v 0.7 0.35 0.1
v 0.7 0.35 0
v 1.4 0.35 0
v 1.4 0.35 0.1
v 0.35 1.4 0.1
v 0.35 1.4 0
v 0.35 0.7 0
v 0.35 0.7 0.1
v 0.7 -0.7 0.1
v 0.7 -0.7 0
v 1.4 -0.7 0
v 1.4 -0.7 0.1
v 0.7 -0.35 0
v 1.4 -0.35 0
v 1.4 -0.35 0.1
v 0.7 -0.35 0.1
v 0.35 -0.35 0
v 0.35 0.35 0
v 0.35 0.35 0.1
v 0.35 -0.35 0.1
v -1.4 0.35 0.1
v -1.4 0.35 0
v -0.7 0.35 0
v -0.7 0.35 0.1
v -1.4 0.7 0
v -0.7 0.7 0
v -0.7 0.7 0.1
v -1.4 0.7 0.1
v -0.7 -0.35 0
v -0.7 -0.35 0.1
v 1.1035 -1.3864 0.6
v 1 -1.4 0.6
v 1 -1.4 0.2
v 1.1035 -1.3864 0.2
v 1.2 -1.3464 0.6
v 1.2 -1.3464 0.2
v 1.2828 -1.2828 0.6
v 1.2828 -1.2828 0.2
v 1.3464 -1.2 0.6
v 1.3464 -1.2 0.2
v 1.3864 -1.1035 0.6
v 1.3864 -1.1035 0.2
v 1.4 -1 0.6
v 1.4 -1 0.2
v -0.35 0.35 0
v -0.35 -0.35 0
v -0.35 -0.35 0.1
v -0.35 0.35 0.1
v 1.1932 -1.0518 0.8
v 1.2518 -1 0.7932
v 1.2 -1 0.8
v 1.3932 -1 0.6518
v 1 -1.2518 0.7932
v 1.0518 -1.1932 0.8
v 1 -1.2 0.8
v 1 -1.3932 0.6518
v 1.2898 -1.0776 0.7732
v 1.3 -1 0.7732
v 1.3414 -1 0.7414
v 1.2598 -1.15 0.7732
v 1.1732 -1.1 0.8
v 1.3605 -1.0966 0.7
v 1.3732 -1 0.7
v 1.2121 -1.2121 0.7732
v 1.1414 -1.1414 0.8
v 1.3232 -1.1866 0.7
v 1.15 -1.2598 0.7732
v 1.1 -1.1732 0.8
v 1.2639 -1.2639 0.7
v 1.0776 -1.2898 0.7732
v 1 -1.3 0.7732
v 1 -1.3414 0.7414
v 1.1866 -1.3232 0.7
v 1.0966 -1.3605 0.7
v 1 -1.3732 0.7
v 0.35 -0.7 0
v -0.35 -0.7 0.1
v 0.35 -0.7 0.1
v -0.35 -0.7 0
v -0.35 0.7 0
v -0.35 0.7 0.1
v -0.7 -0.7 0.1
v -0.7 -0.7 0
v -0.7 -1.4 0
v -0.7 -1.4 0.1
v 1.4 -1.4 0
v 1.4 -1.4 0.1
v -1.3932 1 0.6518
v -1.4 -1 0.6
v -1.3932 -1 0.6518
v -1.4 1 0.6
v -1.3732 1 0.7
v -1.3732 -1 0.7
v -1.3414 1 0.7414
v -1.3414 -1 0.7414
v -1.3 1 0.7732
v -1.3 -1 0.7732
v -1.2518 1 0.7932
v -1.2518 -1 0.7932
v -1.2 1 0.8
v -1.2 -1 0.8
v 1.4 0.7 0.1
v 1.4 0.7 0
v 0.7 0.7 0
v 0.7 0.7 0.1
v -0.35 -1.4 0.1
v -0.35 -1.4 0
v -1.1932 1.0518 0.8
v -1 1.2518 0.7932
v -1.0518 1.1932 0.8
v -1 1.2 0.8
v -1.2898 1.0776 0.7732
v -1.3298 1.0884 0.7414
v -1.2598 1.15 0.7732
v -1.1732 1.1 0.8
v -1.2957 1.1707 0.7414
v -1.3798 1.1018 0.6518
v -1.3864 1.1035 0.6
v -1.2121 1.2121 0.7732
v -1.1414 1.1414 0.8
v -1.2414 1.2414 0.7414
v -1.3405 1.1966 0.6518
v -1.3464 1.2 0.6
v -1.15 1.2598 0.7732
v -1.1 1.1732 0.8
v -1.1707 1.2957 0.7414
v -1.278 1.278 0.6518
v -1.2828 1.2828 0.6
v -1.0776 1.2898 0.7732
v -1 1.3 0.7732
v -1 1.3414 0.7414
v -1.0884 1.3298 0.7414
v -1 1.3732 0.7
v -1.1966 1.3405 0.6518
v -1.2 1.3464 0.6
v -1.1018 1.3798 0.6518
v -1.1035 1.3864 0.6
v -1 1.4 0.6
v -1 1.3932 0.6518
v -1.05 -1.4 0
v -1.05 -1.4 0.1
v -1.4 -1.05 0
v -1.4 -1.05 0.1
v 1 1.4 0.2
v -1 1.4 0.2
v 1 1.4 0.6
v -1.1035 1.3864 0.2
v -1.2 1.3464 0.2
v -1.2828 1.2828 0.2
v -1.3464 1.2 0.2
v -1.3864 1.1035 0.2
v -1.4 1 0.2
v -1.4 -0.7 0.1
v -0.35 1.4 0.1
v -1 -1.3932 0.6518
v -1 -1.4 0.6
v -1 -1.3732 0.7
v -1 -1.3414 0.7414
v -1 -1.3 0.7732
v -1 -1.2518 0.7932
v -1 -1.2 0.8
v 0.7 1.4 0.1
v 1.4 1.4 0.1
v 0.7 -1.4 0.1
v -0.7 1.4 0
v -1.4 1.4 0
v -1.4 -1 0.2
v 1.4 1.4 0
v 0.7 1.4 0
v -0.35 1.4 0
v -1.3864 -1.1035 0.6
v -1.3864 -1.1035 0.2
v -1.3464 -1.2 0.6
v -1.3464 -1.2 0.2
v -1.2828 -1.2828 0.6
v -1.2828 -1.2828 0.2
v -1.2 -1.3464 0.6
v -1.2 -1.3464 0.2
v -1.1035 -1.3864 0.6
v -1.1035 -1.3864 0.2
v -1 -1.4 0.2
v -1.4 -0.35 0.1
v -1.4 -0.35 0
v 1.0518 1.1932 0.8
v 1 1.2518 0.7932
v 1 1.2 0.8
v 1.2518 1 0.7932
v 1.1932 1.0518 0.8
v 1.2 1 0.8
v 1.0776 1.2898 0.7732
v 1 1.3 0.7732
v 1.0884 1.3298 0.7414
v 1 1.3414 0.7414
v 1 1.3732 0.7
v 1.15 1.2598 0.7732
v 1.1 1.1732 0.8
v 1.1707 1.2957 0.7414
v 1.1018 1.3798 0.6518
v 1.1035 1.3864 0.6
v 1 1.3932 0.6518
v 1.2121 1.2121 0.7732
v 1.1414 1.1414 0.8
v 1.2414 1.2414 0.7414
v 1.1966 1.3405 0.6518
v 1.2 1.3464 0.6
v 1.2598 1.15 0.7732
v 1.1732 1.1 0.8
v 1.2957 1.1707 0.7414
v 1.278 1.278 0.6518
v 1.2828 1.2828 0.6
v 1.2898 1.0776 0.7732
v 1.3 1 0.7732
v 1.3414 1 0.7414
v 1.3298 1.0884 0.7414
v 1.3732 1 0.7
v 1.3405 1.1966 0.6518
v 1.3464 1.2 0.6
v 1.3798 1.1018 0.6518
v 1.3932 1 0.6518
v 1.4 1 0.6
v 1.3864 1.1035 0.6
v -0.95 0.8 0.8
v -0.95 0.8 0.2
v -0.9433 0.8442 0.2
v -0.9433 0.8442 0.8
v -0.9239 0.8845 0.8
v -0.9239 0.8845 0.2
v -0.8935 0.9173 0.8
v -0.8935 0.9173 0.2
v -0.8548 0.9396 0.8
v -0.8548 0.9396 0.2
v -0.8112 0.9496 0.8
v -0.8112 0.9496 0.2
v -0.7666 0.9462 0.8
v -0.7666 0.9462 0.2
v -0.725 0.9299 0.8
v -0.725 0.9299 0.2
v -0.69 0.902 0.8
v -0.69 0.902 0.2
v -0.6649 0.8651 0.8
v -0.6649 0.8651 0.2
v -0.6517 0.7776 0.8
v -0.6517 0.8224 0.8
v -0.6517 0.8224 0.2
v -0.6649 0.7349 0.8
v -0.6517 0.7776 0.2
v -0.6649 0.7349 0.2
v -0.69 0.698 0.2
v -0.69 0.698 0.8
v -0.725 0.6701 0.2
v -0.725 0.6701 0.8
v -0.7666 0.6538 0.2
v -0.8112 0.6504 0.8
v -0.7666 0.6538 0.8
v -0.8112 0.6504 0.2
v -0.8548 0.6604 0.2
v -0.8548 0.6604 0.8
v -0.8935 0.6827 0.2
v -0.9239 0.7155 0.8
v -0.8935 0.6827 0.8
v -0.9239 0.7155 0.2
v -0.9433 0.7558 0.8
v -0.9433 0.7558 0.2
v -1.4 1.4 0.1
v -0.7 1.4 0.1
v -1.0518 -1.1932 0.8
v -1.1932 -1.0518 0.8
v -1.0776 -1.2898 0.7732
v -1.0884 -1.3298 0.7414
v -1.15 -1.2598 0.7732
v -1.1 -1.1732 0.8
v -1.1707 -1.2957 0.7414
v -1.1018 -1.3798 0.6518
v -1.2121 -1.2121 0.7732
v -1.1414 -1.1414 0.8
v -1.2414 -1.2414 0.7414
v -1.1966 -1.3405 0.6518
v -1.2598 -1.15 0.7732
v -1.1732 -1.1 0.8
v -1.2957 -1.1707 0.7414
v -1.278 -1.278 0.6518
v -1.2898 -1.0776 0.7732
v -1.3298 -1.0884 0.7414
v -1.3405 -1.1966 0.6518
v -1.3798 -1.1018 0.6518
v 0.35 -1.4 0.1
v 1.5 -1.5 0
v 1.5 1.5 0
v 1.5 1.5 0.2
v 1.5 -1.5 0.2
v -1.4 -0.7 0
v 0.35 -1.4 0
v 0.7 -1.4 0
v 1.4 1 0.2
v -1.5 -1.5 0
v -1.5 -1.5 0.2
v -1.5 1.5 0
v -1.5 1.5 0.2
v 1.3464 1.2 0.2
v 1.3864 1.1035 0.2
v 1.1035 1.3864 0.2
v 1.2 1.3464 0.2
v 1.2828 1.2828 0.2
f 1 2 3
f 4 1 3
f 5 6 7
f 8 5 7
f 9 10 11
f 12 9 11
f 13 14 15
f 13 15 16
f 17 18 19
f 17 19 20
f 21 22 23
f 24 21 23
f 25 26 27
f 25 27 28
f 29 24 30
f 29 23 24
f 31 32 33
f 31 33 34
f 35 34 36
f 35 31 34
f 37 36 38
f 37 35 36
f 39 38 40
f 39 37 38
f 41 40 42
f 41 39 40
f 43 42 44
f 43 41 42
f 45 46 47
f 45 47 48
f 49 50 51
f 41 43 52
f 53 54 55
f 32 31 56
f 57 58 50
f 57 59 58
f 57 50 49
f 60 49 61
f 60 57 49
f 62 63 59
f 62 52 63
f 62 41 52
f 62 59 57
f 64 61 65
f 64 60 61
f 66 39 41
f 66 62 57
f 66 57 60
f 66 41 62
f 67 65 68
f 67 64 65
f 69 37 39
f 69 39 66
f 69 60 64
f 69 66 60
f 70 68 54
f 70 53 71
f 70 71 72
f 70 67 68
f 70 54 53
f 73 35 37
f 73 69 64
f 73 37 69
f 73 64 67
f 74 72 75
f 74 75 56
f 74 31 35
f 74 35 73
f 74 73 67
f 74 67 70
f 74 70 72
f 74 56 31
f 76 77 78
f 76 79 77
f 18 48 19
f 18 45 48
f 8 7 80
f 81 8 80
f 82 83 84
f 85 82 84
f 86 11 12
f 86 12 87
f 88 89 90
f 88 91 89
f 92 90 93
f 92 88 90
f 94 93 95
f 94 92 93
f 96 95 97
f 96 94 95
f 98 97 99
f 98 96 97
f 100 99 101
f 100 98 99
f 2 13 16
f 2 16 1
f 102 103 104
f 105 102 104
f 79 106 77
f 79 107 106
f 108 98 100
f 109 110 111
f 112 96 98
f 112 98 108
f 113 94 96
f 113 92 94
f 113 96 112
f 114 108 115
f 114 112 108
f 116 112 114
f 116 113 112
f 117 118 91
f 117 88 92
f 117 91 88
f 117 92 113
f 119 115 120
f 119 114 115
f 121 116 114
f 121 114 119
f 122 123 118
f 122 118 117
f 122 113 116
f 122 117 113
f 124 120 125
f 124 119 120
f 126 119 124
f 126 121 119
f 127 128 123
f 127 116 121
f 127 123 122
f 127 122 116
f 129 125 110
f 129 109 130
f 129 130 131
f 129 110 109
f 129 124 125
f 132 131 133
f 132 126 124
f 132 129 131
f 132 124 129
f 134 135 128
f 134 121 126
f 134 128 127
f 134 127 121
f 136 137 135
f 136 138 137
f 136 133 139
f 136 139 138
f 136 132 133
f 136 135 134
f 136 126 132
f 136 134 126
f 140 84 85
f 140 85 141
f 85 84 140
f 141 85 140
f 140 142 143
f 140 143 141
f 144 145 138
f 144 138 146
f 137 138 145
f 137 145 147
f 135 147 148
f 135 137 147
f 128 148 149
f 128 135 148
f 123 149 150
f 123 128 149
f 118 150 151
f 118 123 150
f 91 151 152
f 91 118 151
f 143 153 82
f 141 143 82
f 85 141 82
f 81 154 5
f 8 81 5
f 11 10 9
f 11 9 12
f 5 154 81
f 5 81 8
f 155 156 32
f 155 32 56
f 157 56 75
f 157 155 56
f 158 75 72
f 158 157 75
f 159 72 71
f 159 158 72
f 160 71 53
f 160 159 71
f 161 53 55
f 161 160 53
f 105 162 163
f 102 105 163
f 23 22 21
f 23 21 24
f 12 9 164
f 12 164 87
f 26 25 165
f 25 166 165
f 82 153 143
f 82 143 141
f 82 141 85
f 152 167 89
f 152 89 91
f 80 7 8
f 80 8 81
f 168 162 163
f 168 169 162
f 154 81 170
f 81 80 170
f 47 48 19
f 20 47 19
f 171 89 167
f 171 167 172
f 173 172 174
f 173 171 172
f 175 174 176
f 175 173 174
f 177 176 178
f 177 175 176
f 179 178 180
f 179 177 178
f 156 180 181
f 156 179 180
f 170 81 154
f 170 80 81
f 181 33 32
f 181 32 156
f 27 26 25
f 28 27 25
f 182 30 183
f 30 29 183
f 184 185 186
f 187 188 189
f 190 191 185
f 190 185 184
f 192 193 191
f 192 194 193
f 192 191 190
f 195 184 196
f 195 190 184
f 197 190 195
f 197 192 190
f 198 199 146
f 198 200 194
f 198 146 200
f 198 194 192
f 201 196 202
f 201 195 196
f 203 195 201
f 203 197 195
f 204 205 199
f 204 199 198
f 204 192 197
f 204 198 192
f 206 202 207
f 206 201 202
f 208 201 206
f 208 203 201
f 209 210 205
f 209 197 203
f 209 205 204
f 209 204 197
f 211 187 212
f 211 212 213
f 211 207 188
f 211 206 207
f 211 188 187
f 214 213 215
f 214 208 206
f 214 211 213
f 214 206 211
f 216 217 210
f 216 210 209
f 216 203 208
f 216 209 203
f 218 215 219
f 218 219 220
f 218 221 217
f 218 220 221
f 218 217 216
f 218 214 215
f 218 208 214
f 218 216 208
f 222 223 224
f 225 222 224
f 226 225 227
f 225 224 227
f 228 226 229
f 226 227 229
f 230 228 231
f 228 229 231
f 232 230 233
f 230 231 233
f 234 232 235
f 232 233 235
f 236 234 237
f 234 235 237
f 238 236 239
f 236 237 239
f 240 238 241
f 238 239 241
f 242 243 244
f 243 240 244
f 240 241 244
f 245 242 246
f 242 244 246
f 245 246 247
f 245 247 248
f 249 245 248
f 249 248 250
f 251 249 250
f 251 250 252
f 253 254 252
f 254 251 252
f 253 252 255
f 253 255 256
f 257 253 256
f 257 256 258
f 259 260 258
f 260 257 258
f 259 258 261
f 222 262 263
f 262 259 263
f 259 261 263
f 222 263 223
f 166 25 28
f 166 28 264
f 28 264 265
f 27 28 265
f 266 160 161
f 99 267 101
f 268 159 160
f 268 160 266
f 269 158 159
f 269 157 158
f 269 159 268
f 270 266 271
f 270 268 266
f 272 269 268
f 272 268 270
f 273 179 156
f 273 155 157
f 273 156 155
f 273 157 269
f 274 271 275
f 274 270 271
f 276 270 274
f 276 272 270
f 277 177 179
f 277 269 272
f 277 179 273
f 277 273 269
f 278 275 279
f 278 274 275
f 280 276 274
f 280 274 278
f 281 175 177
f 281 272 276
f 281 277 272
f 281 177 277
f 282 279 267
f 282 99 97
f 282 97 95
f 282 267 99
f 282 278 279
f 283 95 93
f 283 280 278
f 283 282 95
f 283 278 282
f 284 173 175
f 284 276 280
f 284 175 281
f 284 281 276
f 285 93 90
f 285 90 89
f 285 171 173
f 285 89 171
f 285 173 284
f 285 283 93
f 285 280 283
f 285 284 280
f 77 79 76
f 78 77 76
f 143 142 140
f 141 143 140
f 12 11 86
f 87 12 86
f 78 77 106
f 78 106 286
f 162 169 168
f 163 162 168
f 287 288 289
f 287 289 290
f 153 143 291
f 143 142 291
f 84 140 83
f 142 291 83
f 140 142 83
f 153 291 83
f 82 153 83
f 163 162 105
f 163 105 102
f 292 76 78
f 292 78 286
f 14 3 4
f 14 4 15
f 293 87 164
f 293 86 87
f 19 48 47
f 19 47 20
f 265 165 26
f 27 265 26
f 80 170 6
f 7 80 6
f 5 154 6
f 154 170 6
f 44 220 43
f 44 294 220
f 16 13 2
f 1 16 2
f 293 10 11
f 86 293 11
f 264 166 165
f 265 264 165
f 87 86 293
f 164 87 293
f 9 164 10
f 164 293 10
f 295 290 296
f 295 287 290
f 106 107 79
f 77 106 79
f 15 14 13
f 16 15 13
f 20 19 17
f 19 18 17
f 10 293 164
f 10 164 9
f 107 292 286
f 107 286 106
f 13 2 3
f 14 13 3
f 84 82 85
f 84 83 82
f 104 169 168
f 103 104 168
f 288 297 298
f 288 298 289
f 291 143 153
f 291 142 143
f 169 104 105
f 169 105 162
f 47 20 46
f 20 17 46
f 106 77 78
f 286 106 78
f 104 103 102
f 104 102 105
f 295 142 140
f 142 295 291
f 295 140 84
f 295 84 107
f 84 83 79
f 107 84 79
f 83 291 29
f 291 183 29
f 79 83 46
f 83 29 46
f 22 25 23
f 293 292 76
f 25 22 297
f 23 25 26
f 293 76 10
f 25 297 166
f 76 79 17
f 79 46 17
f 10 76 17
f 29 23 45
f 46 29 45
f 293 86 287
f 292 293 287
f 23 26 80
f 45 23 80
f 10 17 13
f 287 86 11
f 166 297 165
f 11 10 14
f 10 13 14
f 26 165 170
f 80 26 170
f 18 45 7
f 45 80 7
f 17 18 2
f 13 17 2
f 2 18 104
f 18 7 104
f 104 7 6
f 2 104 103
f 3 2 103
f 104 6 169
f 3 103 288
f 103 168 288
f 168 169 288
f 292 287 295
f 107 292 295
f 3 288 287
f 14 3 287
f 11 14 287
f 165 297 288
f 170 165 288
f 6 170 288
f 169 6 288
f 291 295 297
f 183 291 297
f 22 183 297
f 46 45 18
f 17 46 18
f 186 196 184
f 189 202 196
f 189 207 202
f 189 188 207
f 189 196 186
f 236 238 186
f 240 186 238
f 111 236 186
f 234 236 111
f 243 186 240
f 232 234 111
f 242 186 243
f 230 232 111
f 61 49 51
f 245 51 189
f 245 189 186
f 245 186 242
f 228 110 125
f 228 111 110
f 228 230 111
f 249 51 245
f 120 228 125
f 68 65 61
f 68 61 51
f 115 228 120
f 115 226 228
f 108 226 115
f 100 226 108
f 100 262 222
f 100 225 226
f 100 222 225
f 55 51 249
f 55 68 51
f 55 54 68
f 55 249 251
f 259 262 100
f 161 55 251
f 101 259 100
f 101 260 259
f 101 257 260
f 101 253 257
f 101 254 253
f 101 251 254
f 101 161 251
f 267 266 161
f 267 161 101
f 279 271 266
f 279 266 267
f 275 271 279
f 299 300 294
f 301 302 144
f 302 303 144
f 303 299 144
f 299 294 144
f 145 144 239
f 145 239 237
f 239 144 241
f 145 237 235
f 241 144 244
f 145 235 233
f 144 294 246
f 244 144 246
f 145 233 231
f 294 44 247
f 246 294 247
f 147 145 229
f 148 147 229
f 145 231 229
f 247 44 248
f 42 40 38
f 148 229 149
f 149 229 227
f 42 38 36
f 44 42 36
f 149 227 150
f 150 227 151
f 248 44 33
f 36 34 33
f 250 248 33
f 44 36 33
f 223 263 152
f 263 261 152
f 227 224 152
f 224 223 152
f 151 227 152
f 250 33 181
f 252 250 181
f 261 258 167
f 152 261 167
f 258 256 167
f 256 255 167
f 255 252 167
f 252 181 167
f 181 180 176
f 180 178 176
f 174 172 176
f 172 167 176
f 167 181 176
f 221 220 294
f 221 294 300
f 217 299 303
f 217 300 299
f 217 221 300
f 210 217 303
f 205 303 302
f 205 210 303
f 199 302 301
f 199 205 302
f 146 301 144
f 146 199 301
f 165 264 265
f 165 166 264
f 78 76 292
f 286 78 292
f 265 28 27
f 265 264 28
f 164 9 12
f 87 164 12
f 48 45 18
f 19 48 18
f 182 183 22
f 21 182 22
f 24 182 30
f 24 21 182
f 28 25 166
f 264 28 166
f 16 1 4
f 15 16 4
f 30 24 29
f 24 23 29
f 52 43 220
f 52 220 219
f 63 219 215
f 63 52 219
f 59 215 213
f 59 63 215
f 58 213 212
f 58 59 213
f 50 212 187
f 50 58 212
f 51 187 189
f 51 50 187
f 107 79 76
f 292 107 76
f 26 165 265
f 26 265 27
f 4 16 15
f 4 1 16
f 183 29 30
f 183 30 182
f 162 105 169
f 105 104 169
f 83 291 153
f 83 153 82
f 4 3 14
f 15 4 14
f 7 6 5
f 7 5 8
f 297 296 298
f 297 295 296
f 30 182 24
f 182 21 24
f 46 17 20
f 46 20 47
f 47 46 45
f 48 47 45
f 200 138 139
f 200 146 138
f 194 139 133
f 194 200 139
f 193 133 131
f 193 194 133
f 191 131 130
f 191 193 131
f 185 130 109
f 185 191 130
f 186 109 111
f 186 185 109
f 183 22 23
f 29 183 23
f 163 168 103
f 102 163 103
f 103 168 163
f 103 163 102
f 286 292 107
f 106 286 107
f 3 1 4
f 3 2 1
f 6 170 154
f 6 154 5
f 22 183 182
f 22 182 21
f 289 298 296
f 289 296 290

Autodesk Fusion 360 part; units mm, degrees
sketch "Sketch1" plane through (0, 0, 0) normal (0, 0, 1) x (1, 0, 0)
  line L0 (-1.5, 1.5) -> (1.5, 1.5)
  line L1 (1.5, 1.5) -> (1.5, -1.5)
  line L2 (1.5, -1.5) -> (-1.5, -1.5)
  line L3 (-1.5, -1.5) -> (-1.5, 1.5)
  line L4 (0, 1.5) -> (0, 0) construction
  line L5 (0, 0) -> (-1.5, 0) construction
  dimension "d1" = 3
sketch "Sketch2" plane through (0, 0, 0) normal (0, 0, 1) x (1, 0, 0)
  line L0 (-1.4, 1.4) -> (-0.7, 1.4)
  line L1 (-0.7, 1.4) -> (-0.7, 0.7)
  line L2 (-0.7, 0.7) -> (-1.4, 0.7)
  line L3 (-1.4, 0.7) -> (-1.4, 1.4)
  line L4 (-1.05, 1.4) -> (-1.05, 1.05) construction
  line L5 (-1.05, 1.05) -> (-0.7, 1.05) construction
  line L6 (0.35, 0.7) -> (-0.35, 0.7)
  line L7 (-0.35, 0.7) -> (-0.35, 1.4)
  line L8 (-0.35, 1.4) -> (0.35, 1.4)
  line L9 (0.35, 1.4) -> (0.35, 0.7)
  line L10 (1.4, 0.7) -> (0.7, 0.7)
  line L11 (0.7, 0.7) -> (0.7, 1.4)
  line L12 (0.7, 1.4) -> (1.4, 1.4)
  line L13 (1.4, 1.4) -> (1.4, 0.7)
  line L14 (-0.7, -0.35) -> (-1.4, -0.35)
  line L15 (-1.4, -0.35) -> (-1.4, 0.35)
  line L16 (-1.4, 0.35) -> (-0.7, 0.35)
  line L17 (-0.7, 0.35) -> (-0.7, -0.35)
  line L18 (0.35, -0.35) -> (-0.35, -0.35)
  line L19 (-0.35, -0.35) -> (-0.35, 0.35)
  line L20 (-0.35, 0.35) -> (0.35, 0.35)
  line L21 (0.35, 0.35) -> (0.35, -0.35)
  line L22 (1.4, -0.35) -> (0.7, -0.35)
  line L23 (0.7, -0.35) -> (0.7, 0.35)
  line L24 (0.7, 0.35) -> (1.4, 0.35)
  line L25 (1.4, 0.35) -> (1.4, -0.35)
  line L26 (-0.7, -1.4) -> (-1.4, -1.4)
  line L27 (-1.4, -1.4) -> (-1.4, -0.7)
  line L28 (-1.4, -0.7) -> (-0.7, -0.7)
  line L29 (-0.7, -0.7) -> (-0.7, -1.4)
  line L30 (0.35, -1.4) -> (-0.35, -1.4)
  line L31 (-0.35, -1.4) -> (-0.35, -0.7)
  line L32 (-0.35, -0.7) -> (0.35, -0.7)
  line L33 (0.35, -0.7) -> (0.35, -1.4)
  line L34 (1.4, -1.4) -> (0.7, -1.4)
  line L35 (0.7, -1.4) -> (0.7, -0.7)
  line L36 (0.7, -0.7) -> (1.4, -0.7)
  line L37 (1.4, -0.7) -> (1.4, -1.4)
  line L38 (-1.4, -1.05) -> (-1.05, -1.4)
  dimension "d3" = 0.7
  dimension "d4" = 0.7
  dimension "d5" = 1.05
  dimension "d6" = 1.05
  dimension "d9" = 1.05
  dimension "d10" = -1.05
extrude "Extrude1" add sketch "Sketch1" along normal blind 0.2 makes body 1
sketch "Sketch3" plane through (0, 0, 0.2) normal (0, 0, 1) x (-1, 0, 0)
  line L0 (1.4, -1.4) -> (-1.4, -1.4)
  line L1 (-1.4, -1.4) -> (-1.4, 1.4)
  line L2 (-1.4, 1.4) -> (1.4, 1.4)
  line L3 (1.4, 1.4) -> (1.4, -1.4)
  line L4 (0, -1.4) -> (0, 0) construction
  line L5 (0, 0) -> (1.4, 0) construction
  circle A0 centre (0.8, -0.8) radius 0.15
  dimension "d13" = 2.8
  dimension "d14" = 2.8
  dimension "d15" = 0.3
  dimension "d16" = 0.8
  dimension "d17" = 0.8
extrude "Extrude2" add sketch "Sketch3" along normal blind 0.6 separate body makes body 2
fillet "Fillet1" radius 0.4 4 edges at (-1.4, -1.4, 0.5) (-1.4, 1.4, 0.5) (1.4, 1.4, 0.5) (1.4, -1.4, 0.5) on bodies 2
fillet "Fillet2" radius 0.2 8 edges at (1.2828, -1.2828, 0.8) (1.4, 0, 0.8) (1.2828, 1.2828, 0.8) (0, 1.4, 0.8) (-1.2828, 1.2828, 0.8) (-1.4, 0, 0.8) (-1.2828, -1.2828, 0.8) (0, -1.4, 0.8) on bodies 2
extrude "Extrude3" cut sketch "Sketch2" along normal blind 0.1 contours L0 L1 L2 L3 | L6 L7 L8 L9 | L10 L11 L12 L13 | L14 L15 L16 L17 | L18 L19 L20 L21 | L22 L23 L24 L25 | L26 L27 L28 L29 L38 | L30 L31 L32 L33 | L34 L35 L36 L37 bodies 1
extrude "Extrude4" add sketch "Sketch2" along normal blind 0.1 separate body contours L0 L1 L2 L3 | L6 L7 L8 L9 | L10 L11 L12 L13 | L14 L15 L16 L17 | L18 L19 L20 L21 | L22 L23 L24 L25 | L26 L27 L28 L29 L38 | L30 L31 L32 L33 | L34 L35 L36 L37 makes body 3 at (1.1667, -1.1667, 0) makes body 4 at (-1.1667, 0.1167, 0) makes body 5 at (0.1167, -1.1667, 0) makes body 6 at (-0.1167, 0.1167, 0) makes body 7 at (0.9333, 0.1167, 0) makes body 8 at (-1.1667, 1.1667, 0) makes body 9 at (-1.05, -1.05, 0) makes body 10 at (0.1167, 0.9333, 0) makes body 11 at (1.1667, 0.9333, 0)
equation "d5 = ( 2.1 / 2 ) * 1 mm"
equation "d6 = ( 2.1 / 2 ) * 1 mm"
